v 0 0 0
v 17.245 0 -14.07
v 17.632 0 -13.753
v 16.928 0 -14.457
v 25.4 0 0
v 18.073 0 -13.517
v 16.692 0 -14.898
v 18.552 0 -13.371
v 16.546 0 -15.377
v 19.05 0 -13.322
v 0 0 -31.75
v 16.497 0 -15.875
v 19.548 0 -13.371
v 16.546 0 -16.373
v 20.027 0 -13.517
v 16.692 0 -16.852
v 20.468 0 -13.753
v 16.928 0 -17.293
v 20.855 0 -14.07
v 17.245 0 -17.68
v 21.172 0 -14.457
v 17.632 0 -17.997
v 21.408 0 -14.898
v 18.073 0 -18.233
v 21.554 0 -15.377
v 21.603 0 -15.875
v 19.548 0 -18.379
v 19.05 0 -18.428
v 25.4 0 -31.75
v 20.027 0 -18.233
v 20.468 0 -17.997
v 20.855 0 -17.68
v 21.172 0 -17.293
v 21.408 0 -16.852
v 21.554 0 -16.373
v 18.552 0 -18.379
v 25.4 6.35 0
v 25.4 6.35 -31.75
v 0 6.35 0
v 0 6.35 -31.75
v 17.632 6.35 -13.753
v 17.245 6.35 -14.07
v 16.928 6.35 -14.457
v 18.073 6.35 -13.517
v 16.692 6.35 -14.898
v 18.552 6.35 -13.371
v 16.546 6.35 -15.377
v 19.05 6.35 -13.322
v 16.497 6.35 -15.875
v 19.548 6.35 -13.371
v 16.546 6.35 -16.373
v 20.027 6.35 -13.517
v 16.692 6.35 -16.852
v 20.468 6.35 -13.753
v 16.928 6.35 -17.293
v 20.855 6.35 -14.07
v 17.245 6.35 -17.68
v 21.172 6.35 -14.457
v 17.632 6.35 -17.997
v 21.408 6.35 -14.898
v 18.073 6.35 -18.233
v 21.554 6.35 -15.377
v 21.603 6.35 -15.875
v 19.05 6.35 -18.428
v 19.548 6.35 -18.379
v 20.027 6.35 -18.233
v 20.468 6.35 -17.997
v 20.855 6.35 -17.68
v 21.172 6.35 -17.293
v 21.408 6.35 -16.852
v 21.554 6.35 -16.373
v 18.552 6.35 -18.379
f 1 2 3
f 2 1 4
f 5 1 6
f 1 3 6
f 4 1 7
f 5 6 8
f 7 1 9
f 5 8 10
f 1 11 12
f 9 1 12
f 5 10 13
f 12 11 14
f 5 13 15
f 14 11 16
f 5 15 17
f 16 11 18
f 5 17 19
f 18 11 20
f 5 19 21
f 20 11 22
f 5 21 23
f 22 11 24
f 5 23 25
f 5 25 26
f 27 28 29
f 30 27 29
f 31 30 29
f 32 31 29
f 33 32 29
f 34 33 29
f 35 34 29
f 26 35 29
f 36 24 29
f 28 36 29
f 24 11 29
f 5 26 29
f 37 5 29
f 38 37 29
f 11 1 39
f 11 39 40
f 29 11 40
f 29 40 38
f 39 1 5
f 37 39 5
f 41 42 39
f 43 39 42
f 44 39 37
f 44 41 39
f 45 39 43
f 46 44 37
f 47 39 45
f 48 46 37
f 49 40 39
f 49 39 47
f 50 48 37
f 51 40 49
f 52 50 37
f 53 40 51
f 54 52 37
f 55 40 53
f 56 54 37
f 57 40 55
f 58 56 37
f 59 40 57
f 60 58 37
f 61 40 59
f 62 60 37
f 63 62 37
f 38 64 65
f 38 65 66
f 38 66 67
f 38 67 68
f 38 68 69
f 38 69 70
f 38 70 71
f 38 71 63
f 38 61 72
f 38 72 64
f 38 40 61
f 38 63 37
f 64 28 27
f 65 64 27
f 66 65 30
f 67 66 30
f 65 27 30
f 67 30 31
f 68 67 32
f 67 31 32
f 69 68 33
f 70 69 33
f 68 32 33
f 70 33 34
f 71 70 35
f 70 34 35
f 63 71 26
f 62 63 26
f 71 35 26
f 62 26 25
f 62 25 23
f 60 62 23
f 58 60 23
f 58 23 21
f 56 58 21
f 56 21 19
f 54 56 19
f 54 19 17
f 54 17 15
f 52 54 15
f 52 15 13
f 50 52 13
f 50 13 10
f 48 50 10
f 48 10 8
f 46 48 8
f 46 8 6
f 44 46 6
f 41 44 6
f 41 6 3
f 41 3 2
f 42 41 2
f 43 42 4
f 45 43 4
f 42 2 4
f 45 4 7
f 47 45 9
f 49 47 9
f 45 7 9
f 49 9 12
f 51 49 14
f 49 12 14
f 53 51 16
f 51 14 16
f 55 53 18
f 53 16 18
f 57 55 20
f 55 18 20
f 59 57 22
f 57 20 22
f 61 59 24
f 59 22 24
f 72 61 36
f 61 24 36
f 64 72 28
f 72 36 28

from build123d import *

# Parameters (mm, degrees)
SKETCH2_W                   = 25.4
SKETCH2_H                   = 31.75
BOSS_EXTRUDE1_DEPTH         = 6.35
F_1_4_20_TAPPED_HOLE1_D     = 5.1054
F_1_4_20_TAPPED_HOLE1_DEPTH = 19.05
F_1_4_20_TAPPED_HOLE1_TIP   = 1.533816902


with BuildPart() as part:
    # Sketch2 → Boss-Extrude1 (new body)
    with BuildSketch(Plane(origin=(0, 0, 0), x_dir=(1, 0, 0), z_dir=(0, 1, 0))):
        with Locations((12.7, 15.875)):
            Rectangle(SKETCH2_W, SKETCH2_H)
    extrude(amount=BOSS_EXTRUDE1_DEPTH)

    # 1/4-20 Tapped Hole1
    with Locations(Plane(origin=(19.05, 6.35, -15.875), x_dir=(0, 0, 1), z_dir=(0, 1, 0))):
        with Locations((0, 0)):
            Hole(F_1_4_20_TAPPED_HOLE1_D / 2, depth=F_1_4_20_TAPPED_HOLE1_DEPTH)
            with Locations((0, 0, -(F_1_4_20_TAPPED_HOLE1_DEPTH + F_1_4_20_TAPPED_HOLE1_TIP / 2))):  # 118° drill point
                Cone(0, F_1_4_20_TAPPED_HOLE1_D / 2, F_1_4_20_TAPPED_HOLE1_TIP, mode=Mode.SUBTRACT)


solid = part.part
